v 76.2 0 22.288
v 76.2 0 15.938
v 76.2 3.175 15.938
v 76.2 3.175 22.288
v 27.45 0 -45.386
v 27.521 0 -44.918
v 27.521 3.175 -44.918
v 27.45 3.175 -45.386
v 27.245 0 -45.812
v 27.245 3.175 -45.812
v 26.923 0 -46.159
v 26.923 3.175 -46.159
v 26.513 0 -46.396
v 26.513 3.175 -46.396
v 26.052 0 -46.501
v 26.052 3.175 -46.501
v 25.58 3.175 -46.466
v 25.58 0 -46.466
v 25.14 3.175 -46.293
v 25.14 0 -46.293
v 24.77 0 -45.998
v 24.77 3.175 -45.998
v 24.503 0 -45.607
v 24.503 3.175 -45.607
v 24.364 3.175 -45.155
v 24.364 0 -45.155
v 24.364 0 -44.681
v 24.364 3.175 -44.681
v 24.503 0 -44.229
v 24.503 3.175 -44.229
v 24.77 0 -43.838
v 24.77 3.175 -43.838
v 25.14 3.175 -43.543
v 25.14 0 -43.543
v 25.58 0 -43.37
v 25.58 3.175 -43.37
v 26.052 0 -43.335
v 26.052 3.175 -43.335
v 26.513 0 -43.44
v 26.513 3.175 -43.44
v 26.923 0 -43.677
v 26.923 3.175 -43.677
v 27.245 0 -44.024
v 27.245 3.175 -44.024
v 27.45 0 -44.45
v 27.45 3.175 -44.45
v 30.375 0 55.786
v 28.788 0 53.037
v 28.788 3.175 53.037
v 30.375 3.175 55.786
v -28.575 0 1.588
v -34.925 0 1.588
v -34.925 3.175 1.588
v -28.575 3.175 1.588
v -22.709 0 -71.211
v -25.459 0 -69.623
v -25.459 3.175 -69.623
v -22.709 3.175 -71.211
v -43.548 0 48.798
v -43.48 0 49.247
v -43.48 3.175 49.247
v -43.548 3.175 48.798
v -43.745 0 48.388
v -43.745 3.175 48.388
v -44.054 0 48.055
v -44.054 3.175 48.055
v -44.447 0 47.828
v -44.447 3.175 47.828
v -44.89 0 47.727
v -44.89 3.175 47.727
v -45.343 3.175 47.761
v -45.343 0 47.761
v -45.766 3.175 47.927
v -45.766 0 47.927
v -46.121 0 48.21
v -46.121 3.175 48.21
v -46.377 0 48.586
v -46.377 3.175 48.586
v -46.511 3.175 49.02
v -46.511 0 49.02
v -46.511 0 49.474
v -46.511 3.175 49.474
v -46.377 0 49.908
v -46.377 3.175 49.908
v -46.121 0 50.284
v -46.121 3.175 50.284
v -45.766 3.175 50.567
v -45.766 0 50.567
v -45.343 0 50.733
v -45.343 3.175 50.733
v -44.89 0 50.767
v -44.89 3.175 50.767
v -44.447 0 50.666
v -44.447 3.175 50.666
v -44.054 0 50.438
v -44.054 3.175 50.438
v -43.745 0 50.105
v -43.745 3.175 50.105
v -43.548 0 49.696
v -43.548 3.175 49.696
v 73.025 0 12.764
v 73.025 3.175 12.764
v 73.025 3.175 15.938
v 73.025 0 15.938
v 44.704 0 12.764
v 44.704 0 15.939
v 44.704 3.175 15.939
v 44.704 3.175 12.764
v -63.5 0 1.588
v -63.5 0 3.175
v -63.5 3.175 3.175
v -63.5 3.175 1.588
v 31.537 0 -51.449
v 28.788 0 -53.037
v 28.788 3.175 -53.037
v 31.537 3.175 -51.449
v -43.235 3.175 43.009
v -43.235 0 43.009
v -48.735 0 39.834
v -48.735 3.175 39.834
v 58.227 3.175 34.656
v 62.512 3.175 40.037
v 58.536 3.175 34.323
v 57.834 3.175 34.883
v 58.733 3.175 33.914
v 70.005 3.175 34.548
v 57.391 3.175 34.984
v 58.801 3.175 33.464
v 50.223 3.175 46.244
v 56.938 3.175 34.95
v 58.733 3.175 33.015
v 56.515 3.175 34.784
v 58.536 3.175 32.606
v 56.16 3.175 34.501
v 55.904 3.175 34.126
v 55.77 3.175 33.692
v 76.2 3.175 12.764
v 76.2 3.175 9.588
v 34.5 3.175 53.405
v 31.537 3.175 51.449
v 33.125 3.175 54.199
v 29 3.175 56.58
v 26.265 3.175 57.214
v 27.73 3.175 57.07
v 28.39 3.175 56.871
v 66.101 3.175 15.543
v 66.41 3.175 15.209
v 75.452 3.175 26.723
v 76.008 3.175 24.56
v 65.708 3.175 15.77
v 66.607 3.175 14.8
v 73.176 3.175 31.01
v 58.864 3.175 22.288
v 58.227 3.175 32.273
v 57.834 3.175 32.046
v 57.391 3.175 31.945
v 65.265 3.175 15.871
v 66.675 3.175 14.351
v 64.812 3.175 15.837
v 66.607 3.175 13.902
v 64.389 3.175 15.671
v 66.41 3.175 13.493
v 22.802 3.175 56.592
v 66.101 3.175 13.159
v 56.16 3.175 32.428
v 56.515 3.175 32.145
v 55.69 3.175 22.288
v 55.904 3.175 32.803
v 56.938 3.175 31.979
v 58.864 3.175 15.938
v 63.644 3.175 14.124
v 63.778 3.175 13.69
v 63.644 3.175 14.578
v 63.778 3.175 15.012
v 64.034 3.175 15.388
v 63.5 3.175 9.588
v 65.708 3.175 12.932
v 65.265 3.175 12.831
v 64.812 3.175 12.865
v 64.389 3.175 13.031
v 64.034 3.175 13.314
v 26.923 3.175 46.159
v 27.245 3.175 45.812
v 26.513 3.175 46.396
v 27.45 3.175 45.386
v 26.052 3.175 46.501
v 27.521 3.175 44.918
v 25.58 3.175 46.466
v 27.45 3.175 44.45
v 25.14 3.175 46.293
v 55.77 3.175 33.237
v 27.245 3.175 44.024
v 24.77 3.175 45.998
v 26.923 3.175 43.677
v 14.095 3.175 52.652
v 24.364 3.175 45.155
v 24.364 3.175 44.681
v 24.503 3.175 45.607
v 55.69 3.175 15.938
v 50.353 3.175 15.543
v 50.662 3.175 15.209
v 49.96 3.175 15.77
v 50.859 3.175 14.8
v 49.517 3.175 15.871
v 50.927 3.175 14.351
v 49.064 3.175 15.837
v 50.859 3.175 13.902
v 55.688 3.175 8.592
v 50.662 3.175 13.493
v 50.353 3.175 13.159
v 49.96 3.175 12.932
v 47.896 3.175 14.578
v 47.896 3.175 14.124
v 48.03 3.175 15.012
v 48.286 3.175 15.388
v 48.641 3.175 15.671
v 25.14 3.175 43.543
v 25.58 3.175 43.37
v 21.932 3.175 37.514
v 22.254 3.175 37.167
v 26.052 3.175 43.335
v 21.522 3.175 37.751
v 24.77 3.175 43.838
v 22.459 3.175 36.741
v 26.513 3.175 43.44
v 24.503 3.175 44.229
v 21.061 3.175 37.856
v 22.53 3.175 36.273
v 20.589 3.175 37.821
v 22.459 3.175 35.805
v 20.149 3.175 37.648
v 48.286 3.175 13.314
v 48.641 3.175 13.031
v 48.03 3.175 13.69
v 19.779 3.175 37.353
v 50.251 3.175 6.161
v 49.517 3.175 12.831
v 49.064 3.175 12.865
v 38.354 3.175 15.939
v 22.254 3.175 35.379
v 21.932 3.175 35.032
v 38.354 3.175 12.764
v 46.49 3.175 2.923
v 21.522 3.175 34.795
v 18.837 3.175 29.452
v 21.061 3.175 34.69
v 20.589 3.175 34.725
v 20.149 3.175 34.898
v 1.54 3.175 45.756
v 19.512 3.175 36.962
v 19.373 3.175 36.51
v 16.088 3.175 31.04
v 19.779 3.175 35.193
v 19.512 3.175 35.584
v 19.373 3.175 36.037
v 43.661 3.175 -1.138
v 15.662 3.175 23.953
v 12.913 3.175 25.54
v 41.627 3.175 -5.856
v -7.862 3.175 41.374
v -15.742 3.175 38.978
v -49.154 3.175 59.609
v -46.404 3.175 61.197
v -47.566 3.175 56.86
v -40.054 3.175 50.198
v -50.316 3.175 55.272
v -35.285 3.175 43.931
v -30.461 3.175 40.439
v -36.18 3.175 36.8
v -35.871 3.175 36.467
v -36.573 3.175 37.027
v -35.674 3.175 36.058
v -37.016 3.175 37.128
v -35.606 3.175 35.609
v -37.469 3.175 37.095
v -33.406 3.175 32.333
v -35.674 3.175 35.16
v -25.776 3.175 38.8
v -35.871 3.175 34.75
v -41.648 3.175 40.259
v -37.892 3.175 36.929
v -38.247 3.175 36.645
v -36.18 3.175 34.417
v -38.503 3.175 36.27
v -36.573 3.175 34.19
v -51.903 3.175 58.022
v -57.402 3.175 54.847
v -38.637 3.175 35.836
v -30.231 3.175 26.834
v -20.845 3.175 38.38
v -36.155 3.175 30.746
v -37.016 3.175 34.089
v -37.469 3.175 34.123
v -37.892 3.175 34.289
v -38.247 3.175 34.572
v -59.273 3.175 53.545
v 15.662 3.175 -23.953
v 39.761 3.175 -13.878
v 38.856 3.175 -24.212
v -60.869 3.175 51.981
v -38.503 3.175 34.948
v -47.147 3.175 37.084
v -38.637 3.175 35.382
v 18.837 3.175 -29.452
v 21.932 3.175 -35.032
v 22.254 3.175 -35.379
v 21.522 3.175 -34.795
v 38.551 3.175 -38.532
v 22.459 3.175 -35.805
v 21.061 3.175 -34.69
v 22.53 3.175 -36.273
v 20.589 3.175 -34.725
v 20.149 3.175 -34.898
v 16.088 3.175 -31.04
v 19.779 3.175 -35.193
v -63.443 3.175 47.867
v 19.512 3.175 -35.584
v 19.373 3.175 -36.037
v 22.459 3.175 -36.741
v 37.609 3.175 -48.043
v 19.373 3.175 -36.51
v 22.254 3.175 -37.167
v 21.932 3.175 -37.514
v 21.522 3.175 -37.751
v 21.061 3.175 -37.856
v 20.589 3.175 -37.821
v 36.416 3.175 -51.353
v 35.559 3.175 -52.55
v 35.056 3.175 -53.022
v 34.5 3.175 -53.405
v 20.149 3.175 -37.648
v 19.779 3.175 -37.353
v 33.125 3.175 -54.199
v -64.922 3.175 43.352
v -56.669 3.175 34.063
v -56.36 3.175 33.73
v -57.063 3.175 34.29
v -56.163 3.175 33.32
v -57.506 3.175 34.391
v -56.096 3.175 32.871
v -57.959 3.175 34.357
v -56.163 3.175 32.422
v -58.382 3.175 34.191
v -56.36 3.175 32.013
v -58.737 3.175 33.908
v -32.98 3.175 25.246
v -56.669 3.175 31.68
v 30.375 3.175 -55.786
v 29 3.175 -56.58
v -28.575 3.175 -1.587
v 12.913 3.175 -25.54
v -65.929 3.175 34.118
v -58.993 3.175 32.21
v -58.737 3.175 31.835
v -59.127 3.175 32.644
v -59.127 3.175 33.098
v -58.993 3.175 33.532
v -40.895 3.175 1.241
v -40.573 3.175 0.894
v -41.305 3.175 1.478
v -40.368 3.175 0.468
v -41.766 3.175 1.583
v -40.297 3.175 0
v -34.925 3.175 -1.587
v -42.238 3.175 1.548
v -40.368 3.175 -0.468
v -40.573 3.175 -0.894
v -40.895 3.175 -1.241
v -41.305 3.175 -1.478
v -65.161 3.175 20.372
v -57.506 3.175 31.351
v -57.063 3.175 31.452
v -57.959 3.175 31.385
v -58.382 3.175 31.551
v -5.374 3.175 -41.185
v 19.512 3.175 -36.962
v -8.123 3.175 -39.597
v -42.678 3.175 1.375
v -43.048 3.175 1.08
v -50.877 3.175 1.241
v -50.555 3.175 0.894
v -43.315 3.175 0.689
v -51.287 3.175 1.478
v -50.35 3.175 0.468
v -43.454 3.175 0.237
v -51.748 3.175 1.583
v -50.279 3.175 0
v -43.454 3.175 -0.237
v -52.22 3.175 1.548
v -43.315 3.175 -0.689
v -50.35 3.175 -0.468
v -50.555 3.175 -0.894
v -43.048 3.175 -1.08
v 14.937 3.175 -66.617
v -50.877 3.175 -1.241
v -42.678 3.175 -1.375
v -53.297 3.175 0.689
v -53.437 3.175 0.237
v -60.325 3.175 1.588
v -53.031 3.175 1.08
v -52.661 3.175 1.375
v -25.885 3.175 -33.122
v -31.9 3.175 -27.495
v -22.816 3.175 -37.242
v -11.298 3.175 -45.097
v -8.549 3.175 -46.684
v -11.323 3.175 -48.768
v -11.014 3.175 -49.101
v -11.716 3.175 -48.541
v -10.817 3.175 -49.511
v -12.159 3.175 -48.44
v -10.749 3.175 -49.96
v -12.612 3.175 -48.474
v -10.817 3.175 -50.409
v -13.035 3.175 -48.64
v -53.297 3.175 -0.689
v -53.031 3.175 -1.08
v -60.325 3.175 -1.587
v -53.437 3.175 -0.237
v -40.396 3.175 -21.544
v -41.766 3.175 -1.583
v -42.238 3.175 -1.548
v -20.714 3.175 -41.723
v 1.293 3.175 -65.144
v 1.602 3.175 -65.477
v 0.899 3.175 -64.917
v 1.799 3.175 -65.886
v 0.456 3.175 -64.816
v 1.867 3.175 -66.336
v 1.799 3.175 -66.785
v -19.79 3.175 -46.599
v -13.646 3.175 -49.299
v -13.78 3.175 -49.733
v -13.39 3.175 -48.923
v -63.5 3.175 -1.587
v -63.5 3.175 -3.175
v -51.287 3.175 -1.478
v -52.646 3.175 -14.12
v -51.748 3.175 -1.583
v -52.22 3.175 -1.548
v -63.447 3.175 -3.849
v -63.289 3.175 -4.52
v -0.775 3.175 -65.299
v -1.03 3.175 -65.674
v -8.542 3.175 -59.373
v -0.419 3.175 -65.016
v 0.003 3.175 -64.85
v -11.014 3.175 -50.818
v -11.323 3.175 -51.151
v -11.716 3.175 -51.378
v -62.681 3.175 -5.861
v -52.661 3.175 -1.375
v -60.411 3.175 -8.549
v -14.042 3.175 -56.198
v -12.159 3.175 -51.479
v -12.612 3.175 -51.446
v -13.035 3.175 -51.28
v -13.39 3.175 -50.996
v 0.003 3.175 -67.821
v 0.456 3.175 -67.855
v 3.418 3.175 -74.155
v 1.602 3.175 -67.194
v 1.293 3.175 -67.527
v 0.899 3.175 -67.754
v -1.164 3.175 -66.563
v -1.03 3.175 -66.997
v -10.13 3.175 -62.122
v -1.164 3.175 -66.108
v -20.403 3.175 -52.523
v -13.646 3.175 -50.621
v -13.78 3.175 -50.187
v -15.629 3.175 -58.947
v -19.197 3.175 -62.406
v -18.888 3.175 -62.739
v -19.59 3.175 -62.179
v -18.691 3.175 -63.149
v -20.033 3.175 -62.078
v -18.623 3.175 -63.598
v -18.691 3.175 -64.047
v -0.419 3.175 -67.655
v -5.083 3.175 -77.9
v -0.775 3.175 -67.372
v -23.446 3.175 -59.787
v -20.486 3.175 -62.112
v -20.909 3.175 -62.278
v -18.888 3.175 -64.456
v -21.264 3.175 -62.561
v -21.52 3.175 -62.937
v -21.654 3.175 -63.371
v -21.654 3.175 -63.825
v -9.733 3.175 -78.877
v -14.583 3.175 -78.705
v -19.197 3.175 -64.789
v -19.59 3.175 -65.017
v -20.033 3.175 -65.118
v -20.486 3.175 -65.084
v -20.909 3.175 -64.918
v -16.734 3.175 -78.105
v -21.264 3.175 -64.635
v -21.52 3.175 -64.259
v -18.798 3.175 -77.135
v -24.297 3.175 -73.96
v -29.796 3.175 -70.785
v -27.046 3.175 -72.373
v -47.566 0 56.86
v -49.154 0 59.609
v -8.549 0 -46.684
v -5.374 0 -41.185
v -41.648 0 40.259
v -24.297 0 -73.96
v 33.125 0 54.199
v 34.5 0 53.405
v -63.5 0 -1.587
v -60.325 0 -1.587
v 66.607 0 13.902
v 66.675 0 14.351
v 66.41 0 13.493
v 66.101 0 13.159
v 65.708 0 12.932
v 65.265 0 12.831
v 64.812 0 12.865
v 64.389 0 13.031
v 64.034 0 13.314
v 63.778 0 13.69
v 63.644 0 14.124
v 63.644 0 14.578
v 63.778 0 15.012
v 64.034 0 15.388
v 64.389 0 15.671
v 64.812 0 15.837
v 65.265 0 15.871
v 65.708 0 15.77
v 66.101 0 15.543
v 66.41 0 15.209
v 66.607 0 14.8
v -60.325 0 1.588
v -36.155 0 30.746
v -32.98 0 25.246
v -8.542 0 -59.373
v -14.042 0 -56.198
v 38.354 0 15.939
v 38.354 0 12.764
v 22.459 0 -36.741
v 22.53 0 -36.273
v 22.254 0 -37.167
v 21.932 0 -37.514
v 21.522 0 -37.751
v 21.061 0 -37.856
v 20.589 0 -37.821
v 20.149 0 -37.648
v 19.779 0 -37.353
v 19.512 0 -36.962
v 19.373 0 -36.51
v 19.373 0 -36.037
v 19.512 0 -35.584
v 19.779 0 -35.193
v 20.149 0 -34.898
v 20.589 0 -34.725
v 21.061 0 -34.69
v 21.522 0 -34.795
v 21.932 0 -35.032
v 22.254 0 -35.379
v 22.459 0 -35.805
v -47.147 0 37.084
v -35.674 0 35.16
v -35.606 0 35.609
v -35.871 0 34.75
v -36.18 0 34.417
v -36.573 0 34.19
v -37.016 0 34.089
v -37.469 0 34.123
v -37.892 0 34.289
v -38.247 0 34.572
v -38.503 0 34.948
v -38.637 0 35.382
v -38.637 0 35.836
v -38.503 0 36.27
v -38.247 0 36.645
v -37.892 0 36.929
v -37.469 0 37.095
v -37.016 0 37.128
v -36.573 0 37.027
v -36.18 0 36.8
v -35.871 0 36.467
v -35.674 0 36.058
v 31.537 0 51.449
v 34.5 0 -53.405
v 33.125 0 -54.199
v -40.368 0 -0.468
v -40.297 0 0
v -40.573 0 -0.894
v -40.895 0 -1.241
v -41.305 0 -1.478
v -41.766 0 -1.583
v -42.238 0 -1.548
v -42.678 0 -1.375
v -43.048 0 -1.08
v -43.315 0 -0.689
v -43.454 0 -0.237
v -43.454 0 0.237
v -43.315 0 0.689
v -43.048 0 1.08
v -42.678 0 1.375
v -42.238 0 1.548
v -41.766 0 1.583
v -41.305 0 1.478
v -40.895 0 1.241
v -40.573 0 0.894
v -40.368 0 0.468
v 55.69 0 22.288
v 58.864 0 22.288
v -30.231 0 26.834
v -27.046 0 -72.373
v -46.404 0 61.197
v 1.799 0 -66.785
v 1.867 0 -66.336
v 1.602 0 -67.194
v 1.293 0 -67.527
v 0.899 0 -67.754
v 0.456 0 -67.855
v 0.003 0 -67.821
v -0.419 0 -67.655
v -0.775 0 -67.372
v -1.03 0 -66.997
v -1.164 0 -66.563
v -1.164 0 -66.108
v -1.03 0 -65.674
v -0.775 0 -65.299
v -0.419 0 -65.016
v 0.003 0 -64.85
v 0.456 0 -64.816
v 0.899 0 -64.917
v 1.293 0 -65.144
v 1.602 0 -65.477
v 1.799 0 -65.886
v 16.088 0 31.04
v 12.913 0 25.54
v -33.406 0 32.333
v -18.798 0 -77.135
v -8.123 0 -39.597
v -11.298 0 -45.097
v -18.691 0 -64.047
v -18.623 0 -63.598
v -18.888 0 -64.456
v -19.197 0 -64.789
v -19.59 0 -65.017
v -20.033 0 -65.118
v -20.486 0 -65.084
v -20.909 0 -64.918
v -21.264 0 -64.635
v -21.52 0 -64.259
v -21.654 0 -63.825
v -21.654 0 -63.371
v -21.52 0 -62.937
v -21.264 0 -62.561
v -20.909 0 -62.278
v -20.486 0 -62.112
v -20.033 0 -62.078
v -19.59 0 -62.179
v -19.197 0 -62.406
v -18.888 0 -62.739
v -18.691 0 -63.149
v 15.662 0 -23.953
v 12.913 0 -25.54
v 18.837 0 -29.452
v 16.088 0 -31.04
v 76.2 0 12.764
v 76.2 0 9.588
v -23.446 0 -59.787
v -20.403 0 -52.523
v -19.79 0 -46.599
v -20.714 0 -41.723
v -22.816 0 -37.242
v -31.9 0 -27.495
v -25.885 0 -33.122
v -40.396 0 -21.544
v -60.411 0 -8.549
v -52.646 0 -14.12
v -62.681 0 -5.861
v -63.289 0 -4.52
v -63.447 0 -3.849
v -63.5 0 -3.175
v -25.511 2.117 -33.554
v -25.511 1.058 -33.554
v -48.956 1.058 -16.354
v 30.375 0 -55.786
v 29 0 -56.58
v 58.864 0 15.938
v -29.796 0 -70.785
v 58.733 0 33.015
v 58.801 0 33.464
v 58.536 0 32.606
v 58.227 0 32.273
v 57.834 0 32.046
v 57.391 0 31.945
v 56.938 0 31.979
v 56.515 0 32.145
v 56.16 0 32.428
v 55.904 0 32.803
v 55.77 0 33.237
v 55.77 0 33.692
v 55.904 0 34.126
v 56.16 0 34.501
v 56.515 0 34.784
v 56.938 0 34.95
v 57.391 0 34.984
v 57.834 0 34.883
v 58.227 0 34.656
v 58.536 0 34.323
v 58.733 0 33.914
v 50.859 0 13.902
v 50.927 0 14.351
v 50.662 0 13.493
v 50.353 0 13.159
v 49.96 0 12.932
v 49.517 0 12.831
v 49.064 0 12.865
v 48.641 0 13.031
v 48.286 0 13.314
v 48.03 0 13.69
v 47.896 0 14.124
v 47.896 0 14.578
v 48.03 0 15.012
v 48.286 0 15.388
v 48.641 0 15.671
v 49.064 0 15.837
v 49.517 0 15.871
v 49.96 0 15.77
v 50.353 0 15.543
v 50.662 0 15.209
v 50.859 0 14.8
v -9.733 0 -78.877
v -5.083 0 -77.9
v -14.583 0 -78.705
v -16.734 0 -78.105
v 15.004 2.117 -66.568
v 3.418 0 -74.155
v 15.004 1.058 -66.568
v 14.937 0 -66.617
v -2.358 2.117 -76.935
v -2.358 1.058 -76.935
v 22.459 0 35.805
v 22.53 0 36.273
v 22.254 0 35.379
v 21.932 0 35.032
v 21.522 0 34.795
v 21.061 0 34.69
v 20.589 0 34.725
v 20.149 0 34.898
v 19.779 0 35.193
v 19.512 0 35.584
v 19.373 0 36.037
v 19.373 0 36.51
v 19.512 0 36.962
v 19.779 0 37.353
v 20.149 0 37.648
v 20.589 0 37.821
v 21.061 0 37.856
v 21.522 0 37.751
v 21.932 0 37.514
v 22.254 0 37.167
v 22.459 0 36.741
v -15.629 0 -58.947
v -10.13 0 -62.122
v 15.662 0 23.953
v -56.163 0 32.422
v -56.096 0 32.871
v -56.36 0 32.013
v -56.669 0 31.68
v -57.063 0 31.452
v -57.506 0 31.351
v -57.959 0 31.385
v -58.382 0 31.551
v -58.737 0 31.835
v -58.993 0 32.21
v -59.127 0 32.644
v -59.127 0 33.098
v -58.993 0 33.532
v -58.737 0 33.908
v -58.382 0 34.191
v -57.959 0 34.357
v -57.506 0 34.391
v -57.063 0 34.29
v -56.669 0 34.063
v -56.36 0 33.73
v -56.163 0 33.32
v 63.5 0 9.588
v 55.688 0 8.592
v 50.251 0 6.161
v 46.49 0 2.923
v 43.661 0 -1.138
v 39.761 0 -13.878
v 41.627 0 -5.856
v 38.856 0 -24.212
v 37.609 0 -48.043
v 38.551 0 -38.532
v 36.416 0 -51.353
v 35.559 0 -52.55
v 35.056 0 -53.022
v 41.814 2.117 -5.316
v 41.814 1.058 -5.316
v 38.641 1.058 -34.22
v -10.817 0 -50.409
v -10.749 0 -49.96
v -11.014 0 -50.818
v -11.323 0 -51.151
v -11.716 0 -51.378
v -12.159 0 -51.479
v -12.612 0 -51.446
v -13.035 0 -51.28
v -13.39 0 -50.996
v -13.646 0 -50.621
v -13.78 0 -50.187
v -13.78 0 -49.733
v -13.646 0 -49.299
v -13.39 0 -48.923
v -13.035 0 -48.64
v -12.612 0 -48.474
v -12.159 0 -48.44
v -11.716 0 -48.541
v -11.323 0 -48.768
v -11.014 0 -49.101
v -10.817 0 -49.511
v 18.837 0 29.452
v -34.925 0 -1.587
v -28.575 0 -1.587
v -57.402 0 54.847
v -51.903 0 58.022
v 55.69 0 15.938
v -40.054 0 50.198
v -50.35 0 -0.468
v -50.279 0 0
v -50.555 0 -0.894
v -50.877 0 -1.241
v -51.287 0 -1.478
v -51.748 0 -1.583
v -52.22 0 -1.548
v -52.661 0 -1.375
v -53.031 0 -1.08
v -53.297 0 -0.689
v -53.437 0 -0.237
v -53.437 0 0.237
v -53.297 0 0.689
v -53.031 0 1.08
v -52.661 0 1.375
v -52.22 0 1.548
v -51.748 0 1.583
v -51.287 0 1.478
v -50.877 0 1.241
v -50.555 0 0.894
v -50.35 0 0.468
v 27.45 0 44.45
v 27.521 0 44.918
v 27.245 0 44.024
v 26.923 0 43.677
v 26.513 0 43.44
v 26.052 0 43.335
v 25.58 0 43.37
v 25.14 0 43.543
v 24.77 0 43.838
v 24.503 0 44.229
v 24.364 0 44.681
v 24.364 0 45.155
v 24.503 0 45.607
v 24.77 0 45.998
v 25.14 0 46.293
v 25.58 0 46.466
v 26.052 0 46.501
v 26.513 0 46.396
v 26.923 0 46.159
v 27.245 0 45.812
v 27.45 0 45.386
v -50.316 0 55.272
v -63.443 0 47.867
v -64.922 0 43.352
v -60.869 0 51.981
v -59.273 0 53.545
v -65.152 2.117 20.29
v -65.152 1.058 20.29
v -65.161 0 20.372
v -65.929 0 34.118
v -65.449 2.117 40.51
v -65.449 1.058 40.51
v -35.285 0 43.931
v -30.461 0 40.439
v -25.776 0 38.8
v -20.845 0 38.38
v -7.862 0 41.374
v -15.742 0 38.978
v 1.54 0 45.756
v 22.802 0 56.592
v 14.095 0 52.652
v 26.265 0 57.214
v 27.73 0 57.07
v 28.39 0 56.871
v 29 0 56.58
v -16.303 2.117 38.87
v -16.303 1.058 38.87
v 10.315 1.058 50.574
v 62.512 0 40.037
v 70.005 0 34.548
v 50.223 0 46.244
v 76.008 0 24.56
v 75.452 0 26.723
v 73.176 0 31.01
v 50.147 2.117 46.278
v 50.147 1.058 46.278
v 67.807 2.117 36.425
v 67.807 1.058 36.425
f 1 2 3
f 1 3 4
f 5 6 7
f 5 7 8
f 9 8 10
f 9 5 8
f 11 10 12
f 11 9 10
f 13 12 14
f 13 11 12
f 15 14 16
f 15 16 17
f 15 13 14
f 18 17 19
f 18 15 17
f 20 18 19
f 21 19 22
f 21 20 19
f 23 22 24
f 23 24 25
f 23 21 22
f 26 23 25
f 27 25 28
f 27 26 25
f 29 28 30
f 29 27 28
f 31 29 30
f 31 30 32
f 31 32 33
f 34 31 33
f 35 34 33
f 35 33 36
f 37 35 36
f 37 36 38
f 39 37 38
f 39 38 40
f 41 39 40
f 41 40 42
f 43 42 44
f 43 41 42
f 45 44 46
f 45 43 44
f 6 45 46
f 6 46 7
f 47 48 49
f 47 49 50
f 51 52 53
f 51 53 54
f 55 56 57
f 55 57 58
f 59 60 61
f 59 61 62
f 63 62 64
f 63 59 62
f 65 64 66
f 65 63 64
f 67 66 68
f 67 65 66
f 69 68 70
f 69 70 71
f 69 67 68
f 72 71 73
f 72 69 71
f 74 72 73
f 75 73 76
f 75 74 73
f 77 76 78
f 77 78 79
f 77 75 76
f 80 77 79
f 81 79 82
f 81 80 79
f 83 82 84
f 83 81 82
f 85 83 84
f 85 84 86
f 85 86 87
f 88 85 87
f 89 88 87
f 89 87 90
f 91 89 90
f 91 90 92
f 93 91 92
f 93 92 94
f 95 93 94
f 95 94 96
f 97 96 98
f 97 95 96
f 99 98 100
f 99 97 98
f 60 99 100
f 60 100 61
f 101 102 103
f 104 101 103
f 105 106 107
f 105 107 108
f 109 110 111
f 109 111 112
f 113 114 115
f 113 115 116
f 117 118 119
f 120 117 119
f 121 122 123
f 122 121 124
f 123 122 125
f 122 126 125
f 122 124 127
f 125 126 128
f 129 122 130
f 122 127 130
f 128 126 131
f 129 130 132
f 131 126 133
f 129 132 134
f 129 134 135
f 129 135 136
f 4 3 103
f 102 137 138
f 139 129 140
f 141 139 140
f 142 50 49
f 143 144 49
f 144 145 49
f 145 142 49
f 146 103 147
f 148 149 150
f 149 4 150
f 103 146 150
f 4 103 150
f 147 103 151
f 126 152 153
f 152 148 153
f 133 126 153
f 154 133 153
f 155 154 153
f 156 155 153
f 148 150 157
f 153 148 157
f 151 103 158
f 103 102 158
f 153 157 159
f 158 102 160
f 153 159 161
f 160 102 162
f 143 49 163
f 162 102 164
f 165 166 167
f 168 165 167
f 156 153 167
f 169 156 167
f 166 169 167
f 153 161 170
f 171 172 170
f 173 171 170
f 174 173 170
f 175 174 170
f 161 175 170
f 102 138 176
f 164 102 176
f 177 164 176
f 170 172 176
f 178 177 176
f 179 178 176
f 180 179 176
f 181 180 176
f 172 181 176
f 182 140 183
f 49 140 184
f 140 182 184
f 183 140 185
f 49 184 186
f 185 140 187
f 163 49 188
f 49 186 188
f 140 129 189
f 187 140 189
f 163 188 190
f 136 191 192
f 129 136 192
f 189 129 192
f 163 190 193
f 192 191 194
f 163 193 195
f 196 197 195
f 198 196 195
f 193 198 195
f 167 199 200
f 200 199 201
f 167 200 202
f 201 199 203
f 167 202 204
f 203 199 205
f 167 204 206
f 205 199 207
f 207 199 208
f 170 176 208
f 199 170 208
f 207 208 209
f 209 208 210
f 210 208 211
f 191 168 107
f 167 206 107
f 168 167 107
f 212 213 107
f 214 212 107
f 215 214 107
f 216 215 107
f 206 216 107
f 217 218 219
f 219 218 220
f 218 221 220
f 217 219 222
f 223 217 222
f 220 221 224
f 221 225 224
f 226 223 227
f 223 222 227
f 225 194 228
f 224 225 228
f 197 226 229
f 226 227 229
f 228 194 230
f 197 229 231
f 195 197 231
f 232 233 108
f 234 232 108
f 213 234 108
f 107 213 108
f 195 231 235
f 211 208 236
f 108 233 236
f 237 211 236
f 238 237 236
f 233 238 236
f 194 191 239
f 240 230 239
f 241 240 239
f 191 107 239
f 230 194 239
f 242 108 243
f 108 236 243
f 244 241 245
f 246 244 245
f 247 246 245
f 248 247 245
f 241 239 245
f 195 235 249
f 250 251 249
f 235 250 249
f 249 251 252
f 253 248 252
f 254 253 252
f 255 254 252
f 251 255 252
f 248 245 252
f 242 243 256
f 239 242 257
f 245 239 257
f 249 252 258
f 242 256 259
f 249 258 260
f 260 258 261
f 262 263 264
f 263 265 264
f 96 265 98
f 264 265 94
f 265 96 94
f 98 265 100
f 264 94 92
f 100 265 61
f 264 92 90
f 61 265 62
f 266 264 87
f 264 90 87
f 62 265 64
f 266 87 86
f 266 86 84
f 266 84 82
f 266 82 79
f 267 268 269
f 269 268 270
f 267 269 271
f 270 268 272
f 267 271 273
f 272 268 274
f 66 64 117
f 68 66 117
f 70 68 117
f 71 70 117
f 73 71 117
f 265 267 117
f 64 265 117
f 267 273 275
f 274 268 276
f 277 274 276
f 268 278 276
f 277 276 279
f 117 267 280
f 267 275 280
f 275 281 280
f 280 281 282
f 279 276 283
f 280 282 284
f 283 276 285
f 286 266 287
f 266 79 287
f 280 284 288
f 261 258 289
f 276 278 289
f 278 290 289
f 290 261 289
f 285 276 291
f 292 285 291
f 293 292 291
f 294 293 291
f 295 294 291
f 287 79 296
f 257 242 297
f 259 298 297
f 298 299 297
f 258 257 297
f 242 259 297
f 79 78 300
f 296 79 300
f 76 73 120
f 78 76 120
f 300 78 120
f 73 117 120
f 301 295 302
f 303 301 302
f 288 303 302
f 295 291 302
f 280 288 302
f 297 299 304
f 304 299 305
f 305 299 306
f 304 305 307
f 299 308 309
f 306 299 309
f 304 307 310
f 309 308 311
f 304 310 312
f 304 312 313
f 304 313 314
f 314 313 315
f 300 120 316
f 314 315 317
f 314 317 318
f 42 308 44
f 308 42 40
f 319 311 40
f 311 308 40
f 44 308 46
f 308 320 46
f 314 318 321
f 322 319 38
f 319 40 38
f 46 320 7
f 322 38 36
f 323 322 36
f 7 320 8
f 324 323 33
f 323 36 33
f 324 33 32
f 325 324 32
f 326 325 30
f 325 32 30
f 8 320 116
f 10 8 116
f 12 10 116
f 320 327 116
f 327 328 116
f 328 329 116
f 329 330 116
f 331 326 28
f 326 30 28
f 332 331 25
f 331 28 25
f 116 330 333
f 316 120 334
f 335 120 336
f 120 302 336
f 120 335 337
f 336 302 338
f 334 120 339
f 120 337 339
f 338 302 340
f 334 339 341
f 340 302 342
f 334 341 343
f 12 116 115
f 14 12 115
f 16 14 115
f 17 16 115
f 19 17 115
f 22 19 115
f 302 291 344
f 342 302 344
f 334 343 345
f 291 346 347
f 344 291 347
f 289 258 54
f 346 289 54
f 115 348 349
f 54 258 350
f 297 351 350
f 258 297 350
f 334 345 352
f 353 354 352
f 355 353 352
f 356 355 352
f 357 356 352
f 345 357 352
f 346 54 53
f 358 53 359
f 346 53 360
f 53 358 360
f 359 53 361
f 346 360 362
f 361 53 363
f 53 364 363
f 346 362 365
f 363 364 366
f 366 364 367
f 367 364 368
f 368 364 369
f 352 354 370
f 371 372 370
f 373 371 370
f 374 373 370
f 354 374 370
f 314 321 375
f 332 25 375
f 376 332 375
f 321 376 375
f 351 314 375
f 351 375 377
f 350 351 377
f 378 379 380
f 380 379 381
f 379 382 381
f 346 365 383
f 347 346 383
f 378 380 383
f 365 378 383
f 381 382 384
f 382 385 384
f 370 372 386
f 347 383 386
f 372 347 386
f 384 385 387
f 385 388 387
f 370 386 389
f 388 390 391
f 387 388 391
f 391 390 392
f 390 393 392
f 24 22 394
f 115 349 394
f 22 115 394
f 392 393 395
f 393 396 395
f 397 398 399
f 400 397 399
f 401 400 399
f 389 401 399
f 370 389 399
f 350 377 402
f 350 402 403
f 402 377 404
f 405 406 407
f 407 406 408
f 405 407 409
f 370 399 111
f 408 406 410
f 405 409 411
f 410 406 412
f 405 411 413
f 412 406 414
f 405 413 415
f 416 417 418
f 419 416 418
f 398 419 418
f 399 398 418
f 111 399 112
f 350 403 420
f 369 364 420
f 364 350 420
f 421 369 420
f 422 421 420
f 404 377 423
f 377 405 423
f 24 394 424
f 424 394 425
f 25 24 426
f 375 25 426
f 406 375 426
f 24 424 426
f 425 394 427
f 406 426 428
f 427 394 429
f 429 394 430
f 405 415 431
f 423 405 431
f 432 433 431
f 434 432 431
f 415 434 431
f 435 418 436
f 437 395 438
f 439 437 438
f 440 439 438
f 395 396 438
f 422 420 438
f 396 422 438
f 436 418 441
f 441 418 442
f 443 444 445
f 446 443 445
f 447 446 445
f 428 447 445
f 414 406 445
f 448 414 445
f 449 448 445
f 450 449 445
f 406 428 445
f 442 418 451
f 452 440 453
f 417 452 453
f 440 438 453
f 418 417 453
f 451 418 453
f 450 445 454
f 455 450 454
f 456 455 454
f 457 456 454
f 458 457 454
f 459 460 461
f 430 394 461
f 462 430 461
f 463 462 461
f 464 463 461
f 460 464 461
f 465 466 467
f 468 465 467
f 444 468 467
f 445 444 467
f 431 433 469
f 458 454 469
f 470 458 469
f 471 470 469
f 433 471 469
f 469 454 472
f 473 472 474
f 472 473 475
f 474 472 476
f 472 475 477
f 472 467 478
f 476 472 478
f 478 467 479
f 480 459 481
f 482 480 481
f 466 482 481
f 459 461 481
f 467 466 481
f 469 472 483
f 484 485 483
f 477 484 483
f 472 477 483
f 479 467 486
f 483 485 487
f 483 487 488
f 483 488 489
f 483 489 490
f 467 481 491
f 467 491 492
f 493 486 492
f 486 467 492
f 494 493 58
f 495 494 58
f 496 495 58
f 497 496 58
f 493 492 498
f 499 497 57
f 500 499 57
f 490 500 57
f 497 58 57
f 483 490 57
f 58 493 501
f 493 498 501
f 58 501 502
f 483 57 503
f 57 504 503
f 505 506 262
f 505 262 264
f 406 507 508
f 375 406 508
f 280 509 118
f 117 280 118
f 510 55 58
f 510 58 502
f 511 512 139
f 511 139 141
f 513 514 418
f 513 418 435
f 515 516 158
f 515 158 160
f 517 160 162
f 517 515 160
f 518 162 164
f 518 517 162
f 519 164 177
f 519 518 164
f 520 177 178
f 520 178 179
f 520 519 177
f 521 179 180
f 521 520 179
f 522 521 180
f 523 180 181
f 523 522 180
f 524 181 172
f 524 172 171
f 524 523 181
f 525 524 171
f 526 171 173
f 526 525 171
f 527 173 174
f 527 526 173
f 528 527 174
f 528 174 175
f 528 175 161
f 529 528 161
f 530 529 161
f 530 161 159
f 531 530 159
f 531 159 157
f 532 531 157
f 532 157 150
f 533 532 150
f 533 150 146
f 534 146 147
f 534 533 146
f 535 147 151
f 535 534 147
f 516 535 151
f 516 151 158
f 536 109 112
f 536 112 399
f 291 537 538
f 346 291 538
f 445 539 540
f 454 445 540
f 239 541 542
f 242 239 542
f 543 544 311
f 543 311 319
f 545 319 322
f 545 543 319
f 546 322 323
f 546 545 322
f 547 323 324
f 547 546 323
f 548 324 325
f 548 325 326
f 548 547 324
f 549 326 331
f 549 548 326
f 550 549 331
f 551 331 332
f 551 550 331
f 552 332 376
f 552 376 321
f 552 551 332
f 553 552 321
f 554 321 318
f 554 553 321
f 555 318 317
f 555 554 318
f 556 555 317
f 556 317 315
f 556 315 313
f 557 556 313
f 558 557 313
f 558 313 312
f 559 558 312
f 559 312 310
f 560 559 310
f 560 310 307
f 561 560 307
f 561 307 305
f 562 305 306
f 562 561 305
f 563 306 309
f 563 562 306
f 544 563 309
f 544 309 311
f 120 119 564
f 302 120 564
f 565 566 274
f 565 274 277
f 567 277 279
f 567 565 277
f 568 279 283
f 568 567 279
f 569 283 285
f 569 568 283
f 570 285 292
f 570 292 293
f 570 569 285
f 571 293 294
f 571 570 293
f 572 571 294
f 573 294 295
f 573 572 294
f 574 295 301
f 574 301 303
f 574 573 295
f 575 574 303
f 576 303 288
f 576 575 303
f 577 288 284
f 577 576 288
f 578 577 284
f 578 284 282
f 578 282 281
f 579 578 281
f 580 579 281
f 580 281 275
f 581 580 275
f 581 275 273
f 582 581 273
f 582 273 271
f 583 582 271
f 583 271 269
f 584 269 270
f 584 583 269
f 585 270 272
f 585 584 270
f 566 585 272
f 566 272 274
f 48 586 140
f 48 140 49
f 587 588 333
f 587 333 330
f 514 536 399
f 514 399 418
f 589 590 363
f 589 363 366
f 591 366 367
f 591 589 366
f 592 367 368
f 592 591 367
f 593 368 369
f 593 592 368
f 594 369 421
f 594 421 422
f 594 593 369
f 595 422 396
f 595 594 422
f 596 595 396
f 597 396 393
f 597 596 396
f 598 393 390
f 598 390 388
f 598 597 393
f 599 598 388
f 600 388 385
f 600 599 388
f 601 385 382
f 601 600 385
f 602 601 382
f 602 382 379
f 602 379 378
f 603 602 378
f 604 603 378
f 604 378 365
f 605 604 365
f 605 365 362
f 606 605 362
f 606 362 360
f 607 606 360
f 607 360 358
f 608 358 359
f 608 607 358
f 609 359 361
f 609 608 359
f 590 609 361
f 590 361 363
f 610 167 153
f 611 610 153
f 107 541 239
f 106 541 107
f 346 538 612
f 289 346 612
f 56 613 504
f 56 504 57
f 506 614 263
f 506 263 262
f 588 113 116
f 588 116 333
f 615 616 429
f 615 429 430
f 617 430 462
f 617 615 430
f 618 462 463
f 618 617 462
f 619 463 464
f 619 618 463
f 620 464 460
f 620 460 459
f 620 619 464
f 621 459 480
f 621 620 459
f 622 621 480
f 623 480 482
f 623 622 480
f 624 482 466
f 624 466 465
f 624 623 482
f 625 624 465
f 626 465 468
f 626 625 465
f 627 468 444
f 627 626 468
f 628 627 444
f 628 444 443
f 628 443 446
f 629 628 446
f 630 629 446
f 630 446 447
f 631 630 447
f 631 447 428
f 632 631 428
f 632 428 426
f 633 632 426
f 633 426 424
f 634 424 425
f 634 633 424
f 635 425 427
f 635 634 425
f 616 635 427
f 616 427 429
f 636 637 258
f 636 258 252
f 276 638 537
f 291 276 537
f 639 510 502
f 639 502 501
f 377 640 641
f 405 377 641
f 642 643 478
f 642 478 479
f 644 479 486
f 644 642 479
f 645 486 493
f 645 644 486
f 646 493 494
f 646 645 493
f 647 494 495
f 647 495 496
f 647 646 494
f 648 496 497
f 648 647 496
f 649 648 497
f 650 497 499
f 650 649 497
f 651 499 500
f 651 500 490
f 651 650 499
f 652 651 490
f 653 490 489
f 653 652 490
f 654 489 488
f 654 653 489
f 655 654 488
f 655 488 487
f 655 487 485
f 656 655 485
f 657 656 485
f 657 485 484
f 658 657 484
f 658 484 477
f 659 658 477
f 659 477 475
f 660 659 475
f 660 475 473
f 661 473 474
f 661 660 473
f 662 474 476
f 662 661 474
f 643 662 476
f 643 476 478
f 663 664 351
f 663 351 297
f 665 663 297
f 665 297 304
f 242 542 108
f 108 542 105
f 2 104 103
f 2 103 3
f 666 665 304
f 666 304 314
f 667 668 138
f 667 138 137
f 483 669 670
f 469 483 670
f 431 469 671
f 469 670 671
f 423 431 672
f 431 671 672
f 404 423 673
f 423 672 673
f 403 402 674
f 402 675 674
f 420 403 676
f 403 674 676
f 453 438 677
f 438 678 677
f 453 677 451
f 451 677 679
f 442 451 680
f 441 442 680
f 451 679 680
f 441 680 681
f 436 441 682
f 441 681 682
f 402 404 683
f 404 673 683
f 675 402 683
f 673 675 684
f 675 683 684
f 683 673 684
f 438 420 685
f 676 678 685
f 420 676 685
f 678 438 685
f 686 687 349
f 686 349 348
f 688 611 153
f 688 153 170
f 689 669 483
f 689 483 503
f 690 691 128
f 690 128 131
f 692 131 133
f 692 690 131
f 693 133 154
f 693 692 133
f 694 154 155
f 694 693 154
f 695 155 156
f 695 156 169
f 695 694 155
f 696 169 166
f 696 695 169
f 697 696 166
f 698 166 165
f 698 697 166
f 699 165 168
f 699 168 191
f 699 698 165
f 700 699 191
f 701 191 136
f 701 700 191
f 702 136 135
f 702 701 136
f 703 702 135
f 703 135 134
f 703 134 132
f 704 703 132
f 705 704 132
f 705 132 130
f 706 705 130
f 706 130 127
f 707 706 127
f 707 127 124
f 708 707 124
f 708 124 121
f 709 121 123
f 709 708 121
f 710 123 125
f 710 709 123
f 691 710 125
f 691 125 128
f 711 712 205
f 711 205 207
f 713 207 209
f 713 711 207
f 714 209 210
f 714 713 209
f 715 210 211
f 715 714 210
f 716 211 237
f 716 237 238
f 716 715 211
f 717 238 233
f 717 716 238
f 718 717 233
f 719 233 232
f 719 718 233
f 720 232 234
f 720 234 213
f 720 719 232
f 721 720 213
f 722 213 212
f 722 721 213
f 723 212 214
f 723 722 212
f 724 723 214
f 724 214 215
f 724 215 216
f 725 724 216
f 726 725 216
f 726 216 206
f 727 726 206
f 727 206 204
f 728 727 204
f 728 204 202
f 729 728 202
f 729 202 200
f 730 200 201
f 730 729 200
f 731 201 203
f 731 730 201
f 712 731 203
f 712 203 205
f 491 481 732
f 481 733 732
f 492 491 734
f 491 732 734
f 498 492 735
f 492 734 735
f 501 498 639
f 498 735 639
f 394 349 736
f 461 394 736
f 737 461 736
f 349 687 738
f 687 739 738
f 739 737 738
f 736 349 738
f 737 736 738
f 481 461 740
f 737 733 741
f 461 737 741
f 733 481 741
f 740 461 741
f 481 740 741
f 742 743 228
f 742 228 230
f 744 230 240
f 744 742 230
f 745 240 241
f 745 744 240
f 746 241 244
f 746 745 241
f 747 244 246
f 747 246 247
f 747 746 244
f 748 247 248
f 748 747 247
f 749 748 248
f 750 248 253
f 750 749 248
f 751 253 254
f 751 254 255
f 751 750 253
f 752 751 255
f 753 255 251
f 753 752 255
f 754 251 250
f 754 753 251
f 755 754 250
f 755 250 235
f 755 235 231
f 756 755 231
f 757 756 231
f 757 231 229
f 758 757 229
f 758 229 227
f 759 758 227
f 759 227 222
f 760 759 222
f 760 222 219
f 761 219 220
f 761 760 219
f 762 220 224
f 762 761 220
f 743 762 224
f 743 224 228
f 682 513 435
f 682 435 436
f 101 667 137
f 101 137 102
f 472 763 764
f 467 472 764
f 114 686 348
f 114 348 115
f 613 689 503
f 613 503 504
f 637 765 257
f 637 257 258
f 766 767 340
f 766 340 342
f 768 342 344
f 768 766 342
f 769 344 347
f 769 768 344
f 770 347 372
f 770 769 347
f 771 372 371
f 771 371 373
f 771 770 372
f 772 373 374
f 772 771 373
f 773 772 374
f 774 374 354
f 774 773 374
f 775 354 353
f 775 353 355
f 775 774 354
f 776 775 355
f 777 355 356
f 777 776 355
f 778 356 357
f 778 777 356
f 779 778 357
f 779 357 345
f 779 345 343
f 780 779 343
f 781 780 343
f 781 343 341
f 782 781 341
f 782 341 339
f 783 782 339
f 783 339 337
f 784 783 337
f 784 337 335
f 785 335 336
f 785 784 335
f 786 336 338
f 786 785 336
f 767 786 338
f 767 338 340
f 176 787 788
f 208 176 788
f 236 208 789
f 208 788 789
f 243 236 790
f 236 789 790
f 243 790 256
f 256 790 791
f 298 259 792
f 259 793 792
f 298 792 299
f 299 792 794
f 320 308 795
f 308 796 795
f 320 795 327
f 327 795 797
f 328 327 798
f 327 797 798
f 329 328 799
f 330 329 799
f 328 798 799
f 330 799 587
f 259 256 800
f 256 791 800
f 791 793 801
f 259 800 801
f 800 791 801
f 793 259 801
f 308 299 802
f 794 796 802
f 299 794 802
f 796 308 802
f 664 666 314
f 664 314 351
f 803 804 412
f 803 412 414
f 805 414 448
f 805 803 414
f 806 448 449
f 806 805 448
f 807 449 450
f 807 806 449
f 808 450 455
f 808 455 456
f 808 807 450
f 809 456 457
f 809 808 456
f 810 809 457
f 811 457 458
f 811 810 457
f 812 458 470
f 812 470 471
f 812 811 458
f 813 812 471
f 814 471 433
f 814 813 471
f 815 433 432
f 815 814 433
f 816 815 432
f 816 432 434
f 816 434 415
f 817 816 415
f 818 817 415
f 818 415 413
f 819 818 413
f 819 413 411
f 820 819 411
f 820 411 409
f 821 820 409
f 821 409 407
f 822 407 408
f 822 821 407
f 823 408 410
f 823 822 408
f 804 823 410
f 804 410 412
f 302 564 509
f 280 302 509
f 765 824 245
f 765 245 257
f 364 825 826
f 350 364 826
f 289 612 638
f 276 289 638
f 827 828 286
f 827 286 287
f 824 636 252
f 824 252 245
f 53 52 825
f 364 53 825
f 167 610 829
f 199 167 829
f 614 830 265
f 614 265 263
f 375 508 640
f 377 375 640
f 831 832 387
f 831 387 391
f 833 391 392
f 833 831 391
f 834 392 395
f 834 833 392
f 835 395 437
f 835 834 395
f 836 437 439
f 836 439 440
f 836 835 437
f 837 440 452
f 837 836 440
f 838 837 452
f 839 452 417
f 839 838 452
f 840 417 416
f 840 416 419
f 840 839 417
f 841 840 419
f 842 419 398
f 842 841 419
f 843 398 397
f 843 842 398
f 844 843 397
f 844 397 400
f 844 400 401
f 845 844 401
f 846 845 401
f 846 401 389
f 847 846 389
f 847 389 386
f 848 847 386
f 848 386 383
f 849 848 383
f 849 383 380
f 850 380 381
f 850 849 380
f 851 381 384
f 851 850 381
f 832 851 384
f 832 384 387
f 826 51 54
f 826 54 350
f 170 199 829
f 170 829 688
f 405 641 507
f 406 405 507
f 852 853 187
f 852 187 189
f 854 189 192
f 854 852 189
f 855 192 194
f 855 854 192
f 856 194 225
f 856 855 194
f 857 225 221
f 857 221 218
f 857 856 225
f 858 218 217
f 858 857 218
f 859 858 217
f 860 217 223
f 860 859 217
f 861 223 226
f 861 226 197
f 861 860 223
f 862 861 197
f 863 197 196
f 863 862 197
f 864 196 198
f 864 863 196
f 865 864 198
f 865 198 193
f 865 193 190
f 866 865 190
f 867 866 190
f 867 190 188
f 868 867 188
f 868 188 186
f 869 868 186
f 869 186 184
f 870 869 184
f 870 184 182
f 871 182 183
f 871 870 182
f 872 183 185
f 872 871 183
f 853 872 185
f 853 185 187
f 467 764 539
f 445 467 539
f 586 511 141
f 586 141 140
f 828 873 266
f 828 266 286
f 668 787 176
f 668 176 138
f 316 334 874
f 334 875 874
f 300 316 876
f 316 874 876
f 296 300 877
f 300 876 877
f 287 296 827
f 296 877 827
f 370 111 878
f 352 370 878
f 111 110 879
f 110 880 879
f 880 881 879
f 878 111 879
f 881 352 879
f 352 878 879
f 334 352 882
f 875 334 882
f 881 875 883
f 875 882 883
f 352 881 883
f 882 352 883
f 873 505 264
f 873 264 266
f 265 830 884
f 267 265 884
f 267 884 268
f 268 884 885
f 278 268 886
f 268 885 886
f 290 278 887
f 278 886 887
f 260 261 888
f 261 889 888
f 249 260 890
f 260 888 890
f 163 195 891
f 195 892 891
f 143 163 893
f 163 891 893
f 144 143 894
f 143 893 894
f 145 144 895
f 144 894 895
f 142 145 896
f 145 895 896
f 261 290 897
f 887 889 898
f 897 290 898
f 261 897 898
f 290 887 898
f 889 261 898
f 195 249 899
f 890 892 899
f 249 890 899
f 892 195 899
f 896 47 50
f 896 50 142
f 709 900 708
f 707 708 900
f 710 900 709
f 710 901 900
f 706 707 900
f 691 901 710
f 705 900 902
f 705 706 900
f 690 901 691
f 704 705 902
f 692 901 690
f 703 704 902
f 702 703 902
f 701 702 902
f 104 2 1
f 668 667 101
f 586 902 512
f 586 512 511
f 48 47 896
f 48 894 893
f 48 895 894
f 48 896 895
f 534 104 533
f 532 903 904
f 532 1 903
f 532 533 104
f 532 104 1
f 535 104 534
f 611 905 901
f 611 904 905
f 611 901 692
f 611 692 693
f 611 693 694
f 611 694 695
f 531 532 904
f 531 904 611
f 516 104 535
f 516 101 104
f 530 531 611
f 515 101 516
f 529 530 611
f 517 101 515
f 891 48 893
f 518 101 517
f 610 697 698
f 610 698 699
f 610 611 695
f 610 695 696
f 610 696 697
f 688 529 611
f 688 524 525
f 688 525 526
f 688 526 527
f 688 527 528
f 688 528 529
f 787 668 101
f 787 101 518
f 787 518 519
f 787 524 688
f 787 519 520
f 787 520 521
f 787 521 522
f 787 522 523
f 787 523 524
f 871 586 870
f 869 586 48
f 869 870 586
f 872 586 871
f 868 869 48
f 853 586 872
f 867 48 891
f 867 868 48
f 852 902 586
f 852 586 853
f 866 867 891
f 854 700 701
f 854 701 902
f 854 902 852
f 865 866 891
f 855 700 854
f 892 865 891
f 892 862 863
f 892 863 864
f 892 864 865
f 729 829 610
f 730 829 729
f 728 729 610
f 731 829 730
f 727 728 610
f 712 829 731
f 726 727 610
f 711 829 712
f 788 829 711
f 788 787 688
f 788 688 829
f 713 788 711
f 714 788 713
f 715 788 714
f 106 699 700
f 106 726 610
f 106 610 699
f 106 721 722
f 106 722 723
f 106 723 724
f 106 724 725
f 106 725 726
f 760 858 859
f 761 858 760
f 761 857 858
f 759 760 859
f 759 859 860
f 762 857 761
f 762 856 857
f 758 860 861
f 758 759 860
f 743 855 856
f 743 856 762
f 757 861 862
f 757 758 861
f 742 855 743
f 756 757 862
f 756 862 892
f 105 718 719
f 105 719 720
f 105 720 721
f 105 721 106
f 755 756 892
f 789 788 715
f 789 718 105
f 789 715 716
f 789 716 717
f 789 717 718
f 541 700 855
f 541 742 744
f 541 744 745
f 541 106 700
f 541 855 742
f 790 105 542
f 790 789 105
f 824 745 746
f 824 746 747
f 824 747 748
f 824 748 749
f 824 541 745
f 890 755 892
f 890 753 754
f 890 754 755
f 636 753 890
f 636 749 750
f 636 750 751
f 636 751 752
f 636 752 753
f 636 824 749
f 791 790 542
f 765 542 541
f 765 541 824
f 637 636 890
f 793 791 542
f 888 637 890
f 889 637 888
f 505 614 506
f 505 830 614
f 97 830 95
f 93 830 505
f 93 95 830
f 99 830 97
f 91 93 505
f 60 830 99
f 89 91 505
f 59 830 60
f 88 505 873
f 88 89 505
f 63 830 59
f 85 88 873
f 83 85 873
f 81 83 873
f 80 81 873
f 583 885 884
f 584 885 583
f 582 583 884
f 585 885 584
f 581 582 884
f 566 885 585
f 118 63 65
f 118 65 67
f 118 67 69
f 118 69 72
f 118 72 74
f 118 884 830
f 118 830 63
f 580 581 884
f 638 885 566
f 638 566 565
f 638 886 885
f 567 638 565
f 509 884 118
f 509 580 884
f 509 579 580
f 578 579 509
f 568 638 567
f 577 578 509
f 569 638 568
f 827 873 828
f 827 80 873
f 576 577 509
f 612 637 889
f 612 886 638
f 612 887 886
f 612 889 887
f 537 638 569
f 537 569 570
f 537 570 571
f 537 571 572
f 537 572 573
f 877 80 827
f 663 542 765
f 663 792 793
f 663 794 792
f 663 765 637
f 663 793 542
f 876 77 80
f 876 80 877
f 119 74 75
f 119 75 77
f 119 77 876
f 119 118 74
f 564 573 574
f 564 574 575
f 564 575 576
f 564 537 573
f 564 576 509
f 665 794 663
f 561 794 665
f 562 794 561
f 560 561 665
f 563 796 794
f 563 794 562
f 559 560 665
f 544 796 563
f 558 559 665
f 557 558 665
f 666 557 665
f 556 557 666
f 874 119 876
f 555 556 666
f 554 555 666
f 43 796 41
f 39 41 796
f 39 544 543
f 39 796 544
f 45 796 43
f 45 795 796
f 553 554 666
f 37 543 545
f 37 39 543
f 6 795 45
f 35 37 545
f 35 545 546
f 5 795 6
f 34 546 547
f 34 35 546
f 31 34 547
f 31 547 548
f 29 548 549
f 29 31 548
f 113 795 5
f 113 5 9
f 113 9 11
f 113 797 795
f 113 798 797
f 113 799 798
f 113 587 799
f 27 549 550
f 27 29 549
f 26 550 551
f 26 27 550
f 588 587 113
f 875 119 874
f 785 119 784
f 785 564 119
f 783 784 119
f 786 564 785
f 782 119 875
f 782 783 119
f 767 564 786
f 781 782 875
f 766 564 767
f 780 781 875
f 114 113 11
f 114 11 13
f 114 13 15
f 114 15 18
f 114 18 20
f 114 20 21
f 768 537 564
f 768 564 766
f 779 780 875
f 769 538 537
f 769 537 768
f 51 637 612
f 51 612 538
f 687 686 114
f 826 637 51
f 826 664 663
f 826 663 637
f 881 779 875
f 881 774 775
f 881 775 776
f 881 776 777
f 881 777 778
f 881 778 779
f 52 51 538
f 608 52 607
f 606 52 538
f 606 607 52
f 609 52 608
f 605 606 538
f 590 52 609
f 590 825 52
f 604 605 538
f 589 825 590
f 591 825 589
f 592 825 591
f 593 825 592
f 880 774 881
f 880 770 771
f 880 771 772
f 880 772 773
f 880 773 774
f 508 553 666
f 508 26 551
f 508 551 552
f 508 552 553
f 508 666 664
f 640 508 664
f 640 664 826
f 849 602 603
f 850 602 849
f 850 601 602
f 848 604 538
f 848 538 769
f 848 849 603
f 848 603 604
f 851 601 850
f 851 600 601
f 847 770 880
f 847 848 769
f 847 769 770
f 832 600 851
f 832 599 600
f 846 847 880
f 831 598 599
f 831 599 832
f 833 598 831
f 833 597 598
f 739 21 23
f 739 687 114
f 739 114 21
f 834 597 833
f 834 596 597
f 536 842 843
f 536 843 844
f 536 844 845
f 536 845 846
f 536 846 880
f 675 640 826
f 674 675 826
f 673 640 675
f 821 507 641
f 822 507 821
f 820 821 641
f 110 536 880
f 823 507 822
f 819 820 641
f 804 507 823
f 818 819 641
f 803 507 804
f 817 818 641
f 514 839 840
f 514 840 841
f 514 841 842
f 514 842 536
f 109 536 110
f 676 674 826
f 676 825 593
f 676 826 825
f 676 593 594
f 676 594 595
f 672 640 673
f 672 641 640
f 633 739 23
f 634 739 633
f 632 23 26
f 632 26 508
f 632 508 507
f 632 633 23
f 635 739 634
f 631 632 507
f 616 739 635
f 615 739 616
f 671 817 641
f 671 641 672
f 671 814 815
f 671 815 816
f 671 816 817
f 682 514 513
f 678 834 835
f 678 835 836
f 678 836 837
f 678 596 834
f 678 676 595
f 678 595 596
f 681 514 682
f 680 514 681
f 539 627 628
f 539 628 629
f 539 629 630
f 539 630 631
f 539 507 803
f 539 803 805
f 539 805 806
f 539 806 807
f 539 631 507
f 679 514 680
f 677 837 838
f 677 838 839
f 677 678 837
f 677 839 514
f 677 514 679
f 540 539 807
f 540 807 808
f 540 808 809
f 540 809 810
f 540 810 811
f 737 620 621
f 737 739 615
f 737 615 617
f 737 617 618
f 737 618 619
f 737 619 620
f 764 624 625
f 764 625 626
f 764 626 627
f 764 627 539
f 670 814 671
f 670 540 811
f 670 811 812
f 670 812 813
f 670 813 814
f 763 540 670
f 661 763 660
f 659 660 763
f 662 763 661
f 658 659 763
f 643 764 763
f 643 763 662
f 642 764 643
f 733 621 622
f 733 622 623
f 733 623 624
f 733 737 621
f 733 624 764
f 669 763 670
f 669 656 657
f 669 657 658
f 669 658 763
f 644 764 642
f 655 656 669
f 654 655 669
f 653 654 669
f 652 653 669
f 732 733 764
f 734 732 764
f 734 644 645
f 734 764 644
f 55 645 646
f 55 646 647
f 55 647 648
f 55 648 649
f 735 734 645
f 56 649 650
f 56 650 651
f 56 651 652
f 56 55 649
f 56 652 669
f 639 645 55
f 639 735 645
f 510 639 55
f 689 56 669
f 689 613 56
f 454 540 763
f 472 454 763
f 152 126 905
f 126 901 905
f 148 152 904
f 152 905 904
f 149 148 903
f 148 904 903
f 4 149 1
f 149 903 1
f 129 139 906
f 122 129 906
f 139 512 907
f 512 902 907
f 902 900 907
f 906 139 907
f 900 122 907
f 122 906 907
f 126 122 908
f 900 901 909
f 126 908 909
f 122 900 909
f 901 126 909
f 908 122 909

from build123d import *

# Parameters (mm, degrees)
SKETCH1_R           = 1.524
SKETCH1_R_2         = 1.587500001
SKETCH1_R_3         = 1.5875
SKETCH1_R_4         = 1.523999993
SKETCH1_R_5         = 1.523999992
SKETCH1_R_6         = 1.587499996
SKETCH1_R_7         = 1.523999994
SKETCH1_R_8         = 1.587499994
SKETCH1_W           = 6.35
SKETCH1_H           = 3.175
SKETCH1_W_2         = 3.175
SKETCH1_H_2         = 6.35
BOSS_EXTRUDE1_DEPTH = 3.175


with BuildPart() as part:
    # Sketch1 → Boss-Extrude1 (new body)
    with BuildSketch(Plane(origin=(0, 0, 0), x_dir=(1, 0, 0), z_dir=(0, 1, 0))):
        with BuildLine():
            Line((-46.403884523, -61.196885763), (-49.15351518, -59.609385763))
            Line((-49.15351518, -59.609385763), (-47.56601518, -56.859755106))
            Line((-47.56601518, -56.859755106), (-50.315645837, -55.272255106))
            Line((-50.315645837, -55.272255106), (-51.903145837, -58.021885763))
            Line((-51.903145837, -58.021885763), (-57.402407151, -54.846885763))
            add(Edge.make_bspline(
                [(-63.499999964, -3.175000051), (-63.499999964, -15.74075082), (-71.94938611, -46.448183545), (-57.402407151, -54.846885763)],
                knots=[0, 0, 0, 0, 1, 1, 1, 1], degree=3))
            Line((-63.499999964, -3.175000051), (-63.499999964, -1.587500051))
            Line((-63.499999964, -1.587500051), (-60.324999964, -1.587500051))
            Line((-60.324999964, -1.587500051), (-60.324999964, 1.587499949))
            Line((-60.324999964, 1.587499949), (-63.499999964, 1.587499949))
            Line((-63.499999964, 1.587499949), (-63.499999964, 3.174999949))
            add(Edge.make_bspline(
                [(-23.44611538, 59.78686309), (-4.72729916, 27.364922338), (-63.499999964, 16.015994216), (-63.499999964, 3.174999949)],
                knots=[0, 0, 0, 0, 1, 1, 1, 1], degree=3))
            Line((-23.44611538, 59.78686309), (-29.79611538, 70.785385718))
            Line((-29.79611538, 70.785385718), (-27.046484723, 72.372885718))
            Line((-27.046484723, 72.372885718), (-25.458984723, 69.623255061))
            Line((-25.458984723, 69.623255061), (-22.709354066, 71.210755061))
            Line((-22.709354066, 71.210755061), (-24.296854066, 73.960385718))
            Line((-24.296854066, 73.960385718), (-18.797592752, 77.135385718))
            add(Edge.make_bspline(
                [(29.000369343, 56.58011314), (18.118109959, 62.862988525), (-4.250613793, 85.534087936), (-18.797592752, 77.135385718)],
                knots=[0, 0, 0, 0, 1, 1, 1, 1], degree=3))
            Line((29.000369343, 56.58011314), (30.375184671, 55.786363141))
            Line((30.375184671, 55.786363141), (28.787684671, 53.036732484))
            Line((28.787684671, 53.036732484), (31.537315328, 51.449232484))
            Line((31.537315328, 51.449232484), (33.124815328, 54.198863141))
            Line((33.124815328, 54.198863141), (34.499630657, 53.405113141))
            add(Edge.make_bspline(
                [(63.5, -9.5885), (26.062367559, -9.5885), (45.620257902, 46.984616007), (34.499630657, 53.405113141)],
                knots=[0, 0, 0, 0, 1, 1, 1, 1], degree=3))
            Line((63.5, -9.5885), (76.2, -9.5885))
            Line((76.2, -9.5885), (76.2, -12.7635))
            Line((76.2, -12.7635), (73.025, -12.7635))
            Line((73.025, -12.7635), (73.025, -15.9385))
            Line((73.025, -15.9385), (76.2, -15.9385))
            Line((76.2, -15.9385), (76.2, -22.2885))
            add(Edge.make_bspline(
                [(34.499630719, -53.405113134), (45.381890103, -47.122237749), (76.2, -39.085904436), (76.2, -22.2885)],
                knots=[0, 0, 0, 0, 1, 1, 1, 1], degree=3))
            Line((34.499630719, -53.405113134), (33.12481539, -54.198863134))
            Line((33.12481539, -54.198863134), (31.53731539, -51.449232477))
            Line((31.53731539, -51.449232477), (28.787684733, -53.036732477))
            Line((28.787684733, -53.036732477), (30.375184734, -55.786363134))
            Line((30.375184734, -55.786363134), (29.000369405, -56.580113134))
            add(Edge.make_bspline(
                [(-40.053884523, -50.198363135), (-21.335068302, -17.776422383), (17.87974216, -63.000610268), (29.000369405, -56.580113134)],
                knots=[0, 0, 0, 0, 1, 1, 1, 1], degree=3))
            Line((-40.053884523, -50.198363135), (-46.403884523, -61.196885763))
        make_face()
        with Locations((65.151, -14.351)):
            Circle(SKETCH1_R, mode=Mode.SUBTRACT)
        with Locations((49.403, -14.351)):
            Circle(SKETCH1_R, mode=Mode.SUBTRACT)
        with Locations((25.933399999, 44.917966413)):
            Circle(SKETCH1_R_2, mode=Mode.SUBTRACT)
        with Locations((20.9423, 36.273127627)):
            Circle(SKETCH1_R_3, mode=Mode.SUBTRACT)
        with Locations((-45.003830508, -49.246921076)):
            Circle(SKETCH1_R_4, mode=Mode.SUBTRACT)
        with Locations((-37.129830508, -35.608753018)):
            Circle(SKETCH1_R_5, mode=Mode.SUBTRACT)
        with Locations((25.933400062, -44.917966407)):
            Circle(SKETCH1_R_6, mode=Mode.SUBTRACT)
        with Locations((20.942300062, -36.273127622)):
            Circle(SKETCH1_R_3, mode=Mode.SUBTRACT)
        with Locations((-20.147169395, 63.597921031)):
            Circle(SKETCH1_R_7, mode=Mode.SUBTRACT)
        with Locations((-12.273169395, 49.959752973)):
            Circle(SKETCH1_R_4, mode=Mode.SUBTRACT)
        with Locations((-51.866799964, -5.1e-08)):
            Circle(SKETCH1_R_8, mode=Mode.SUBTRACT)
        with Locations((-41.884599964, -5.1e-08)):
            Circle(SKETCH1_R_3, mode=Mode.SUBTRACT)
        with Locations((57.277, -33.4645)):
            Circle(SKETCH1_R, mode=Mode.SUBTRACT)
        with Locations((-57.619607125, -32.871087053)):
            Circle(SKETCH1_R, mode=Mode.SUBTRACT)
        with Locations((0.342607125, 66.335587053)):
            Circle(SKETCH1_R, mode=Mode.SUBTRACT)
        Polygon((15.662315328, 23.952925913), (18.837315328, 29.452187227), (16.087684671, 31.039687227), (12.912684671, 25.540425913), align=None, mode=Mode.SUBTRACT)
        Polygon((-41.647895898, -40.259271724), (-43.235395898, -43.008902381), (-48.734657212, -39.833902381), (-47.147157212, -37.084271724), align=None, mode=Mode.SUBTRACT)
        with Locations((41.529, -14.351)):
            Rectangle(SKETCH1_W, SKETCH1_H, mode=Mode.SUBTRACT)
        Polygon((12.912684733, -25.540425908), (16.087684733, -31.039687222), (18.83731539, -29.452187222), (15.66231539, -23.952925908), align=None, mode=Mode.SUBTRACT)
        Polygon((-30.23051518, -26.833788331), (-33.40551518, -32.333049645), (-36.155145837, -30.745549645), (-32.980145837, -25.246288331), align=None, mode=Mode.SUBTRACT)
        with Locations((-31.749999964, -5e-08)):
            Rectangle(SKETCH1_W, SKETCH1_H, mode=Mode.SUBTRACT)
        Polygon((-8.123484723, 39.597288286), (-11.298484723, 45.0965496), (-8.548854066, 46.6840496), (-5.373854066, 41.184788286), align=None, mode=Mode.SUBTRACT)
        with Locations((57.277, -19.1135)):
            Rectangle(SKETCH1_W_2, SKETCH1_H_2, mode=Mode.SUBTRACT)
        Polygon((-14.041604102, 56.197771724), (-15.629104102, 58.947402381), (-10.129842788, 62.122402381), (-8.542342788, 59.372771724), align=None, mode=Mode.SUBTRACT)
    extrude(amount=BOSS_EXTRUDE1_DEPTH)


solid = part.part
